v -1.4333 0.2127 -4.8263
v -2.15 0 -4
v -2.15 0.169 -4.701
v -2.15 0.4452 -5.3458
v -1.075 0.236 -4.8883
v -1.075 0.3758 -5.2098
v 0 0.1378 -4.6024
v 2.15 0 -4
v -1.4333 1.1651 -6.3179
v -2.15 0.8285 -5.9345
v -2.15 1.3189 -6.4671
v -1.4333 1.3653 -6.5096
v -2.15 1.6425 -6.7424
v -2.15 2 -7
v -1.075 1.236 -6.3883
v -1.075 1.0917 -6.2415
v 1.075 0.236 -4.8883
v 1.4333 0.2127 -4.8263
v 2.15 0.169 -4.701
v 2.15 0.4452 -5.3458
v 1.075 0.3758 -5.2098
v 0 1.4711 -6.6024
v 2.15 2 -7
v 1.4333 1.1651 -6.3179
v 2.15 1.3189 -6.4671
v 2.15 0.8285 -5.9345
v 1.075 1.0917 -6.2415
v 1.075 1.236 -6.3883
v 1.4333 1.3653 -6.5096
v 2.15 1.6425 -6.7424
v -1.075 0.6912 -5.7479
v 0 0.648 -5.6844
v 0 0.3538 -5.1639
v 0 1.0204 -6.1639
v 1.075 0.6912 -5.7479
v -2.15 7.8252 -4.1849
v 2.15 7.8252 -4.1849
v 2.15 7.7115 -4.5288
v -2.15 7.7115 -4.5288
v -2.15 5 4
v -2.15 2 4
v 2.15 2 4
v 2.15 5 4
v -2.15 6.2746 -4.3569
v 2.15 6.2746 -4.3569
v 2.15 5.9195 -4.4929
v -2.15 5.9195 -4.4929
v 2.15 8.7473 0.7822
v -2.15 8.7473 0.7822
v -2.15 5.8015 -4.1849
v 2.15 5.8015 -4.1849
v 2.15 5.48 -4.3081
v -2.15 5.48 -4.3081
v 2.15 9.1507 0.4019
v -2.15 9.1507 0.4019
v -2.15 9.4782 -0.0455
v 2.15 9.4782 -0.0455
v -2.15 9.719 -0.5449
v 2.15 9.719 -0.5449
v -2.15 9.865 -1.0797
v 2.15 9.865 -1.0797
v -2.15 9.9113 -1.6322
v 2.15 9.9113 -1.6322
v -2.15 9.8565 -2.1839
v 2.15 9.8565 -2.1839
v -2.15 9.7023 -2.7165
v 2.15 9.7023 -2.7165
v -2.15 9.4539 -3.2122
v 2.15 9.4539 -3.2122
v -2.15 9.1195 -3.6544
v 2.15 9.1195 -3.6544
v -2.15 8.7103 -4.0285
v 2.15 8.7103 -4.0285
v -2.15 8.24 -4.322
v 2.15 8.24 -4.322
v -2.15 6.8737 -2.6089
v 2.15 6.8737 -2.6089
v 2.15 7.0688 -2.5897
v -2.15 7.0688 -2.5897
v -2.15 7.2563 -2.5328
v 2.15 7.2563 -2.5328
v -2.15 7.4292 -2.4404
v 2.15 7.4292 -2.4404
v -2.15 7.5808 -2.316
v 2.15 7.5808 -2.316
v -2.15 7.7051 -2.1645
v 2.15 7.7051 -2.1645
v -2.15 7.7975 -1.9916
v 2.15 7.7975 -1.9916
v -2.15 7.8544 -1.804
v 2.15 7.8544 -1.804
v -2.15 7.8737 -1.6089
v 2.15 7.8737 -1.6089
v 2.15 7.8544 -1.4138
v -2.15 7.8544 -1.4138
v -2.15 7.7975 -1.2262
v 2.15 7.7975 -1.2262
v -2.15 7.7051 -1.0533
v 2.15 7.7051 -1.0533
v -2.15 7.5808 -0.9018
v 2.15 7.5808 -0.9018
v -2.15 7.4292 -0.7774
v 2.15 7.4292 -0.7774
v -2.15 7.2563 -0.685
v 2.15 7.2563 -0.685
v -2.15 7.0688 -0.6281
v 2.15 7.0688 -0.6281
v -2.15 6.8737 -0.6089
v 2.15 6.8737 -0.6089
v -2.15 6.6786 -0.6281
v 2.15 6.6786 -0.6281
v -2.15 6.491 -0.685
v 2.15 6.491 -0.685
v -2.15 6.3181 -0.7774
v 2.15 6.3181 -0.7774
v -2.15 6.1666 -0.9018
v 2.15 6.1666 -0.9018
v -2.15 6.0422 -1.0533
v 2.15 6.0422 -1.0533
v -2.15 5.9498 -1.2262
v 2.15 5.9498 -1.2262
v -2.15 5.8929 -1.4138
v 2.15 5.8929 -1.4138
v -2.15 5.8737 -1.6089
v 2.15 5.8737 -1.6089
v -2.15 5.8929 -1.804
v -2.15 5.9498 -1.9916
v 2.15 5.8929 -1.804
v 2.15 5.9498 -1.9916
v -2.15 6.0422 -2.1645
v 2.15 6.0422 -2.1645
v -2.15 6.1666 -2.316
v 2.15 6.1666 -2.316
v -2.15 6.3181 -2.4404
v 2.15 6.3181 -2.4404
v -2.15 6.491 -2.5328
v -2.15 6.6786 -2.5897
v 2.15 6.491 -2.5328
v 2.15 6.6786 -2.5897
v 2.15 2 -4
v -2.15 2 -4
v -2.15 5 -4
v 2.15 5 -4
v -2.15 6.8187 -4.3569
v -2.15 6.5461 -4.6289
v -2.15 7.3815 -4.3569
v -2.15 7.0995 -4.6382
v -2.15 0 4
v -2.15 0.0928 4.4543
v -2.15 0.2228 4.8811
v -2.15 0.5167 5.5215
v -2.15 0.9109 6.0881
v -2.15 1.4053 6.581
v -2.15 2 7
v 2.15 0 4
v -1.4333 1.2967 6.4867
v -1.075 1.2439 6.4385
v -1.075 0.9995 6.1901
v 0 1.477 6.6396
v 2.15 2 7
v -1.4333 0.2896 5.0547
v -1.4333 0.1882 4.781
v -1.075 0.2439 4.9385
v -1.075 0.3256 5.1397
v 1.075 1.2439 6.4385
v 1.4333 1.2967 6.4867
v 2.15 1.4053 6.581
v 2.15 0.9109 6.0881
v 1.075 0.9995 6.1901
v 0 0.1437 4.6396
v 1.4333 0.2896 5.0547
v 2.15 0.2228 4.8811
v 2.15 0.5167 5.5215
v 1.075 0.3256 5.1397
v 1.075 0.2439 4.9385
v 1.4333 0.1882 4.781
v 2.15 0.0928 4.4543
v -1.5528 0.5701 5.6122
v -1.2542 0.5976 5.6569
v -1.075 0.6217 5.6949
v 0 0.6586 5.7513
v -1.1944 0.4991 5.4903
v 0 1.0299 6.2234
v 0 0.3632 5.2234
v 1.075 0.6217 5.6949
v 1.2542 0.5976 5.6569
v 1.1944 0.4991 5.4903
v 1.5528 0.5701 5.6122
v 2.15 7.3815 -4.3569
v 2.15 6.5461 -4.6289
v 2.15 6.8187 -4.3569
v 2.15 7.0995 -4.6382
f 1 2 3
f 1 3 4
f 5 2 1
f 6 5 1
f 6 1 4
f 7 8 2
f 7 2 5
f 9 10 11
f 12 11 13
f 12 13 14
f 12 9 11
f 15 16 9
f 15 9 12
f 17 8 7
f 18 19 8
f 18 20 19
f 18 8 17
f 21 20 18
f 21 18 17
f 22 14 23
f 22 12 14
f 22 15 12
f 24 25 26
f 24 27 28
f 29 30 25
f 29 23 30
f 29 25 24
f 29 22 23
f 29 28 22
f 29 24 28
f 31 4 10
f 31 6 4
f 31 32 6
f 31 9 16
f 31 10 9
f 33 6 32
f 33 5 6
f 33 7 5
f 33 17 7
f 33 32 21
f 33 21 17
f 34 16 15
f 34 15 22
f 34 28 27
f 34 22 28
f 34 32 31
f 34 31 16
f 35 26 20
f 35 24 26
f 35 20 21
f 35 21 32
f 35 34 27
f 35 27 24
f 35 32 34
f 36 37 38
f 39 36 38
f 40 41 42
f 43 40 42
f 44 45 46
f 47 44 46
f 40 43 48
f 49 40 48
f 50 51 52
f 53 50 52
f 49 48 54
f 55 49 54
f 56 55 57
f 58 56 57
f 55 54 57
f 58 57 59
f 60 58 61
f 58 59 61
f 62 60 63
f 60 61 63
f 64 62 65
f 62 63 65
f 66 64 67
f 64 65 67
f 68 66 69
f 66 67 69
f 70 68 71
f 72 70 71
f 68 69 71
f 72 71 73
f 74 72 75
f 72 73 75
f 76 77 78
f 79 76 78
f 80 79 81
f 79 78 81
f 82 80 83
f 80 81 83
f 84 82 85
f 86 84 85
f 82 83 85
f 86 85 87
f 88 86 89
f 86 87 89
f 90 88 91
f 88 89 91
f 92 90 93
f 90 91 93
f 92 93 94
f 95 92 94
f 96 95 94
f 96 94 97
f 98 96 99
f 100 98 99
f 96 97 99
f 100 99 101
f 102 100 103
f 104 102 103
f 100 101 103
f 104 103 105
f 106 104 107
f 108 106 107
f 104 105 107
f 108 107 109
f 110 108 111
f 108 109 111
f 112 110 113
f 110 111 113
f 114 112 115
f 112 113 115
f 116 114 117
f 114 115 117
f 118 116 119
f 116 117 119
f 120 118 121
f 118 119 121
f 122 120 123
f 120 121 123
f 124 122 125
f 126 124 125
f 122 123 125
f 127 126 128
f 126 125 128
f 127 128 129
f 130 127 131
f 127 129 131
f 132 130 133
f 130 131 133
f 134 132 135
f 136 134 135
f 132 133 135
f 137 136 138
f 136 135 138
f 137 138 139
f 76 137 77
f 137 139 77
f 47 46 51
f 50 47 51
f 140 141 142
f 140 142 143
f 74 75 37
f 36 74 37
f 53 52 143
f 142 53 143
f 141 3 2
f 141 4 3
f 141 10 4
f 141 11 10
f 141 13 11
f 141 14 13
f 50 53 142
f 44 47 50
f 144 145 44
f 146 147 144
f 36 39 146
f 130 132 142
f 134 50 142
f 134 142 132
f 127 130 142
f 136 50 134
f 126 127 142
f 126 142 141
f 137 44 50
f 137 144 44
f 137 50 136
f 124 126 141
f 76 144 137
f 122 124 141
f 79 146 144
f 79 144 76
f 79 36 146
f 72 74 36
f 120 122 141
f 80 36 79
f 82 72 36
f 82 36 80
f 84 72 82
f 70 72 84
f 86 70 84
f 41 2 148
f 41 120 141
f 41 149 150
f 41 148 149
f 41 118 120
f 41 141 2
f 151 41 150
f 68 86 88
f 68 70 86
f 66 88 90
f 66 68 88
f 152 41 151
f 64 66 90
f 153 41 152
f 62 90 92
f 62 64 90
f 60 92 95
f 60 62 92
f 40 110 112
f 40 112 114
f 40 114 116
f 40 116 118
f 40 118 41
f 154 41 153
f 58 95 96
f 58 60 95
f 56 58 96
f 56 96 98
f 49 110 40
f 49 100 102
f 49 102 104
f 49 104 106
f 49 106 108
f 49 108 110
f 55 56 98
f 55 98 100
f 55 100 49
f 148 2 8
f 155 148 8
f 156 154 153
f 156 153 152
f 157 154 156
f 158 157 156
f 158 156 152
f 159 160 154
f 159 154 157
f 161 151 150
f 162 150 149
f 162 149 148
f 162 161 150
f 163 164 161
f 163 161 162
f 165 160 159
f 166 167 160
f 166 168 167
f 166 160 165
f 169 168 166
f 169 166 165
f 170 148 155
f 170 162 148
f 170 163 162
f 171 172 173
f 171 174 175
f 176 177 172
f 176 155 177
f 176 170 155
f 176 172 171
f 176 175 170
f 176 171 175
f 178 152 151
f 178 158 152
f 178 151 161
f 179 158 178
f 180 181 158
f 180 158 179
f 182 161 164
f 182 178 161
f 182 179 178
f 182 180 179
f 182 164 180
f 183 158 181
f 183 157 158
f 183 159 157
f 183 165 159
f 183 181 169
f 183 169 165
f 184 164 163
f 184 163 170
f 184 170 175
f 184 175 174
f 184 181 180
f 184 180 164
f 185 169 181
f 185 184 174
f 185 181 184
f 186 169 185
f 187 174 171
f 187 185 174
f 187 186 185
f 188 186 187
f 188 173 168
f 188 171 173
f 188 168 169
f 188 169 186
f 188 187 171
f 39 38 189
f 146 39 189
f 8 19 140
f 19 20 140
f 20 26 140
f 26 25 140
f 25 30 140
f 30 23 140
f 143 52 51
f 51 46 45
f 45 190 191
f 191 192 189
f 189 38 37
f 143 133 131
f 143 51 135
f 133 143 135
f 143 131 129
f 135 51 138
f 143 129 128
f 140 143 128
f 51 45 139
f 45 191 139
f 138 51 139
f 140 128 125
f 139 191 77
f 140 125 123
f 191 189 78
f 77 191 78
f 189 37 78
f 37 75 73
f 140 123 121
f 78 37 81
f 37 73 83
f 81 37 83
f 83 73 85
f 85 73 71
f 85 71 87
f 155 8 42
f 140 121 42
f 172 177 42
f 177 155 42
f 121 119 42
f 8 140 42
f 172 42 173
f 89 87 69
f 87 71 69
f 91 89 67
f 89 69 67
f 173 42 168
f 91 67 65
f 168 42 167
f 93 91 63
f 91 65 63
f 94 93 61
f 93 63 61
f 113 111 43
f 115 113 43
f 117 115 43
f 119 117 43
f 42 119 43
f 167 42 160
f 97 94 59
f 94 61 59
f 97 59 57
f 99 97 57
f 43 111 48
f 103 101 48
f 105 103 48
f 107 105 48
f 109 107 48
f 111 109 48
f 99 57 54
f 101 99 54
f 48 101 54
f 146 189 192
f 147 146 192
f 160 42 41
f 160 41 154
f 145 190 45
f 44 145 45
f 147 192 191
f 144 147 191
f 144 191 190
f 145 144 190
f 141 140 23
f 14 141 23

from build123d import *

# Parameters (mm, degrees)
SKETCH_1_W      = 4.3
SKETCH_1_H      = 8
EXTRUDE_1_DEPTH = 5
EXTRUDE_2_DEPTH = 4.3
SKETCH_3_R      = 1
EXTRUDE_3_DEPTH = 4.3


with BuildPart() as part:
    # 草图1 → 凸台-拉伸1 (new body)
    with BuildSketch(Plane(origin=(0, 0, 0), x_dir=(1, 0, 0), z_dir=(0, 1, 0))):
        Rectangle(SKETCH_1_W, SKETCH_1_H)
    extrude(amount=EXTRUDE_1_DEPTH)

    # 草图2 → 凸台-拉伸2 (add)
    with BuildSketch(Plane(origin=(2.15, 0, 0), x_dir=(0, 0, -1), z_dir=(1, 0, 0))):
        with BuildLine():
            Line((-4, 2), (-7, 2))
            add(Edge.make_bspline(
                [(-7, 2), (-6.002659385, 0.317190086), (-4, 0)],
                knots=[0, 0, 0, 1, 1, 1], degree=2))
            Line((-4, 0), (-4, 2))
        make_face()
        with BuildLine():
            Line((4, 2), (7, 2))
            add(Edge.make_bspline(
                [(4, 0), (5.86881421, 0.295991093), (7, 2)],
                knots=[0, 0, 0, 1, 1, 1], degree=2))
            Line((4, 0), (4, 2))
        make_face()
    extrude(amount=-EXTRUDE_2_DEPTH)

    # 草图3 → 凸台-拉伸3 (add)
    with BuildSketch(Plane(origin=(2.15, 0, 0), x_dir=(0, 0, -1), z_dir=(1, 0, 0))):
        with BuildLine():
            Line((-4, 5), (-0.782236668, 8.747328908))
            ThreePointArc((-0.782236668, 8.747328908), (1.909340646, 9.896542185), (4.322038795, 8.239989368))
            Line((4.322038795, 8.239989368), (4.184905625, 7.825161592))
            Line((4.184905625, 7.825161592), (4.528840035, 7.711464249))
            Line((4.528840035, 7.711464249), (4.35687283, 7.38145986))
            Line((4.35687283, 7.38145986), (4.638246106, 7.099532702))
            Line((4.638246106, 7.099532702), (4.35687283, 6.81871222))
            Line((4.35687283, 6.81871222), (4.628943103, 6.546106378))
            Line((4.628943103, 6.546106378), (4.35687283, 6.274570623))
            Line((4.35687283, 6.274570623), (4.492907966, 5.919485397))
            Line((4.492907966, 5.919485397), (4.184905625, 5.801487977))
            Line((4.184905625, 5.801487977), (4.3080813, 5.479969112))
            Line((4.3080813, 5.479969112), (4, 5))
            Line((4, 5), (-4, 5))
        make_face()
        with Locations((1.608881666, 6.873664454)):
            Circle(SKETCH_3_R, mode=Mode.SUBTRACT)
    extrude(amount=-EXTRUDE_3_DEPTH)


solid = part.part
